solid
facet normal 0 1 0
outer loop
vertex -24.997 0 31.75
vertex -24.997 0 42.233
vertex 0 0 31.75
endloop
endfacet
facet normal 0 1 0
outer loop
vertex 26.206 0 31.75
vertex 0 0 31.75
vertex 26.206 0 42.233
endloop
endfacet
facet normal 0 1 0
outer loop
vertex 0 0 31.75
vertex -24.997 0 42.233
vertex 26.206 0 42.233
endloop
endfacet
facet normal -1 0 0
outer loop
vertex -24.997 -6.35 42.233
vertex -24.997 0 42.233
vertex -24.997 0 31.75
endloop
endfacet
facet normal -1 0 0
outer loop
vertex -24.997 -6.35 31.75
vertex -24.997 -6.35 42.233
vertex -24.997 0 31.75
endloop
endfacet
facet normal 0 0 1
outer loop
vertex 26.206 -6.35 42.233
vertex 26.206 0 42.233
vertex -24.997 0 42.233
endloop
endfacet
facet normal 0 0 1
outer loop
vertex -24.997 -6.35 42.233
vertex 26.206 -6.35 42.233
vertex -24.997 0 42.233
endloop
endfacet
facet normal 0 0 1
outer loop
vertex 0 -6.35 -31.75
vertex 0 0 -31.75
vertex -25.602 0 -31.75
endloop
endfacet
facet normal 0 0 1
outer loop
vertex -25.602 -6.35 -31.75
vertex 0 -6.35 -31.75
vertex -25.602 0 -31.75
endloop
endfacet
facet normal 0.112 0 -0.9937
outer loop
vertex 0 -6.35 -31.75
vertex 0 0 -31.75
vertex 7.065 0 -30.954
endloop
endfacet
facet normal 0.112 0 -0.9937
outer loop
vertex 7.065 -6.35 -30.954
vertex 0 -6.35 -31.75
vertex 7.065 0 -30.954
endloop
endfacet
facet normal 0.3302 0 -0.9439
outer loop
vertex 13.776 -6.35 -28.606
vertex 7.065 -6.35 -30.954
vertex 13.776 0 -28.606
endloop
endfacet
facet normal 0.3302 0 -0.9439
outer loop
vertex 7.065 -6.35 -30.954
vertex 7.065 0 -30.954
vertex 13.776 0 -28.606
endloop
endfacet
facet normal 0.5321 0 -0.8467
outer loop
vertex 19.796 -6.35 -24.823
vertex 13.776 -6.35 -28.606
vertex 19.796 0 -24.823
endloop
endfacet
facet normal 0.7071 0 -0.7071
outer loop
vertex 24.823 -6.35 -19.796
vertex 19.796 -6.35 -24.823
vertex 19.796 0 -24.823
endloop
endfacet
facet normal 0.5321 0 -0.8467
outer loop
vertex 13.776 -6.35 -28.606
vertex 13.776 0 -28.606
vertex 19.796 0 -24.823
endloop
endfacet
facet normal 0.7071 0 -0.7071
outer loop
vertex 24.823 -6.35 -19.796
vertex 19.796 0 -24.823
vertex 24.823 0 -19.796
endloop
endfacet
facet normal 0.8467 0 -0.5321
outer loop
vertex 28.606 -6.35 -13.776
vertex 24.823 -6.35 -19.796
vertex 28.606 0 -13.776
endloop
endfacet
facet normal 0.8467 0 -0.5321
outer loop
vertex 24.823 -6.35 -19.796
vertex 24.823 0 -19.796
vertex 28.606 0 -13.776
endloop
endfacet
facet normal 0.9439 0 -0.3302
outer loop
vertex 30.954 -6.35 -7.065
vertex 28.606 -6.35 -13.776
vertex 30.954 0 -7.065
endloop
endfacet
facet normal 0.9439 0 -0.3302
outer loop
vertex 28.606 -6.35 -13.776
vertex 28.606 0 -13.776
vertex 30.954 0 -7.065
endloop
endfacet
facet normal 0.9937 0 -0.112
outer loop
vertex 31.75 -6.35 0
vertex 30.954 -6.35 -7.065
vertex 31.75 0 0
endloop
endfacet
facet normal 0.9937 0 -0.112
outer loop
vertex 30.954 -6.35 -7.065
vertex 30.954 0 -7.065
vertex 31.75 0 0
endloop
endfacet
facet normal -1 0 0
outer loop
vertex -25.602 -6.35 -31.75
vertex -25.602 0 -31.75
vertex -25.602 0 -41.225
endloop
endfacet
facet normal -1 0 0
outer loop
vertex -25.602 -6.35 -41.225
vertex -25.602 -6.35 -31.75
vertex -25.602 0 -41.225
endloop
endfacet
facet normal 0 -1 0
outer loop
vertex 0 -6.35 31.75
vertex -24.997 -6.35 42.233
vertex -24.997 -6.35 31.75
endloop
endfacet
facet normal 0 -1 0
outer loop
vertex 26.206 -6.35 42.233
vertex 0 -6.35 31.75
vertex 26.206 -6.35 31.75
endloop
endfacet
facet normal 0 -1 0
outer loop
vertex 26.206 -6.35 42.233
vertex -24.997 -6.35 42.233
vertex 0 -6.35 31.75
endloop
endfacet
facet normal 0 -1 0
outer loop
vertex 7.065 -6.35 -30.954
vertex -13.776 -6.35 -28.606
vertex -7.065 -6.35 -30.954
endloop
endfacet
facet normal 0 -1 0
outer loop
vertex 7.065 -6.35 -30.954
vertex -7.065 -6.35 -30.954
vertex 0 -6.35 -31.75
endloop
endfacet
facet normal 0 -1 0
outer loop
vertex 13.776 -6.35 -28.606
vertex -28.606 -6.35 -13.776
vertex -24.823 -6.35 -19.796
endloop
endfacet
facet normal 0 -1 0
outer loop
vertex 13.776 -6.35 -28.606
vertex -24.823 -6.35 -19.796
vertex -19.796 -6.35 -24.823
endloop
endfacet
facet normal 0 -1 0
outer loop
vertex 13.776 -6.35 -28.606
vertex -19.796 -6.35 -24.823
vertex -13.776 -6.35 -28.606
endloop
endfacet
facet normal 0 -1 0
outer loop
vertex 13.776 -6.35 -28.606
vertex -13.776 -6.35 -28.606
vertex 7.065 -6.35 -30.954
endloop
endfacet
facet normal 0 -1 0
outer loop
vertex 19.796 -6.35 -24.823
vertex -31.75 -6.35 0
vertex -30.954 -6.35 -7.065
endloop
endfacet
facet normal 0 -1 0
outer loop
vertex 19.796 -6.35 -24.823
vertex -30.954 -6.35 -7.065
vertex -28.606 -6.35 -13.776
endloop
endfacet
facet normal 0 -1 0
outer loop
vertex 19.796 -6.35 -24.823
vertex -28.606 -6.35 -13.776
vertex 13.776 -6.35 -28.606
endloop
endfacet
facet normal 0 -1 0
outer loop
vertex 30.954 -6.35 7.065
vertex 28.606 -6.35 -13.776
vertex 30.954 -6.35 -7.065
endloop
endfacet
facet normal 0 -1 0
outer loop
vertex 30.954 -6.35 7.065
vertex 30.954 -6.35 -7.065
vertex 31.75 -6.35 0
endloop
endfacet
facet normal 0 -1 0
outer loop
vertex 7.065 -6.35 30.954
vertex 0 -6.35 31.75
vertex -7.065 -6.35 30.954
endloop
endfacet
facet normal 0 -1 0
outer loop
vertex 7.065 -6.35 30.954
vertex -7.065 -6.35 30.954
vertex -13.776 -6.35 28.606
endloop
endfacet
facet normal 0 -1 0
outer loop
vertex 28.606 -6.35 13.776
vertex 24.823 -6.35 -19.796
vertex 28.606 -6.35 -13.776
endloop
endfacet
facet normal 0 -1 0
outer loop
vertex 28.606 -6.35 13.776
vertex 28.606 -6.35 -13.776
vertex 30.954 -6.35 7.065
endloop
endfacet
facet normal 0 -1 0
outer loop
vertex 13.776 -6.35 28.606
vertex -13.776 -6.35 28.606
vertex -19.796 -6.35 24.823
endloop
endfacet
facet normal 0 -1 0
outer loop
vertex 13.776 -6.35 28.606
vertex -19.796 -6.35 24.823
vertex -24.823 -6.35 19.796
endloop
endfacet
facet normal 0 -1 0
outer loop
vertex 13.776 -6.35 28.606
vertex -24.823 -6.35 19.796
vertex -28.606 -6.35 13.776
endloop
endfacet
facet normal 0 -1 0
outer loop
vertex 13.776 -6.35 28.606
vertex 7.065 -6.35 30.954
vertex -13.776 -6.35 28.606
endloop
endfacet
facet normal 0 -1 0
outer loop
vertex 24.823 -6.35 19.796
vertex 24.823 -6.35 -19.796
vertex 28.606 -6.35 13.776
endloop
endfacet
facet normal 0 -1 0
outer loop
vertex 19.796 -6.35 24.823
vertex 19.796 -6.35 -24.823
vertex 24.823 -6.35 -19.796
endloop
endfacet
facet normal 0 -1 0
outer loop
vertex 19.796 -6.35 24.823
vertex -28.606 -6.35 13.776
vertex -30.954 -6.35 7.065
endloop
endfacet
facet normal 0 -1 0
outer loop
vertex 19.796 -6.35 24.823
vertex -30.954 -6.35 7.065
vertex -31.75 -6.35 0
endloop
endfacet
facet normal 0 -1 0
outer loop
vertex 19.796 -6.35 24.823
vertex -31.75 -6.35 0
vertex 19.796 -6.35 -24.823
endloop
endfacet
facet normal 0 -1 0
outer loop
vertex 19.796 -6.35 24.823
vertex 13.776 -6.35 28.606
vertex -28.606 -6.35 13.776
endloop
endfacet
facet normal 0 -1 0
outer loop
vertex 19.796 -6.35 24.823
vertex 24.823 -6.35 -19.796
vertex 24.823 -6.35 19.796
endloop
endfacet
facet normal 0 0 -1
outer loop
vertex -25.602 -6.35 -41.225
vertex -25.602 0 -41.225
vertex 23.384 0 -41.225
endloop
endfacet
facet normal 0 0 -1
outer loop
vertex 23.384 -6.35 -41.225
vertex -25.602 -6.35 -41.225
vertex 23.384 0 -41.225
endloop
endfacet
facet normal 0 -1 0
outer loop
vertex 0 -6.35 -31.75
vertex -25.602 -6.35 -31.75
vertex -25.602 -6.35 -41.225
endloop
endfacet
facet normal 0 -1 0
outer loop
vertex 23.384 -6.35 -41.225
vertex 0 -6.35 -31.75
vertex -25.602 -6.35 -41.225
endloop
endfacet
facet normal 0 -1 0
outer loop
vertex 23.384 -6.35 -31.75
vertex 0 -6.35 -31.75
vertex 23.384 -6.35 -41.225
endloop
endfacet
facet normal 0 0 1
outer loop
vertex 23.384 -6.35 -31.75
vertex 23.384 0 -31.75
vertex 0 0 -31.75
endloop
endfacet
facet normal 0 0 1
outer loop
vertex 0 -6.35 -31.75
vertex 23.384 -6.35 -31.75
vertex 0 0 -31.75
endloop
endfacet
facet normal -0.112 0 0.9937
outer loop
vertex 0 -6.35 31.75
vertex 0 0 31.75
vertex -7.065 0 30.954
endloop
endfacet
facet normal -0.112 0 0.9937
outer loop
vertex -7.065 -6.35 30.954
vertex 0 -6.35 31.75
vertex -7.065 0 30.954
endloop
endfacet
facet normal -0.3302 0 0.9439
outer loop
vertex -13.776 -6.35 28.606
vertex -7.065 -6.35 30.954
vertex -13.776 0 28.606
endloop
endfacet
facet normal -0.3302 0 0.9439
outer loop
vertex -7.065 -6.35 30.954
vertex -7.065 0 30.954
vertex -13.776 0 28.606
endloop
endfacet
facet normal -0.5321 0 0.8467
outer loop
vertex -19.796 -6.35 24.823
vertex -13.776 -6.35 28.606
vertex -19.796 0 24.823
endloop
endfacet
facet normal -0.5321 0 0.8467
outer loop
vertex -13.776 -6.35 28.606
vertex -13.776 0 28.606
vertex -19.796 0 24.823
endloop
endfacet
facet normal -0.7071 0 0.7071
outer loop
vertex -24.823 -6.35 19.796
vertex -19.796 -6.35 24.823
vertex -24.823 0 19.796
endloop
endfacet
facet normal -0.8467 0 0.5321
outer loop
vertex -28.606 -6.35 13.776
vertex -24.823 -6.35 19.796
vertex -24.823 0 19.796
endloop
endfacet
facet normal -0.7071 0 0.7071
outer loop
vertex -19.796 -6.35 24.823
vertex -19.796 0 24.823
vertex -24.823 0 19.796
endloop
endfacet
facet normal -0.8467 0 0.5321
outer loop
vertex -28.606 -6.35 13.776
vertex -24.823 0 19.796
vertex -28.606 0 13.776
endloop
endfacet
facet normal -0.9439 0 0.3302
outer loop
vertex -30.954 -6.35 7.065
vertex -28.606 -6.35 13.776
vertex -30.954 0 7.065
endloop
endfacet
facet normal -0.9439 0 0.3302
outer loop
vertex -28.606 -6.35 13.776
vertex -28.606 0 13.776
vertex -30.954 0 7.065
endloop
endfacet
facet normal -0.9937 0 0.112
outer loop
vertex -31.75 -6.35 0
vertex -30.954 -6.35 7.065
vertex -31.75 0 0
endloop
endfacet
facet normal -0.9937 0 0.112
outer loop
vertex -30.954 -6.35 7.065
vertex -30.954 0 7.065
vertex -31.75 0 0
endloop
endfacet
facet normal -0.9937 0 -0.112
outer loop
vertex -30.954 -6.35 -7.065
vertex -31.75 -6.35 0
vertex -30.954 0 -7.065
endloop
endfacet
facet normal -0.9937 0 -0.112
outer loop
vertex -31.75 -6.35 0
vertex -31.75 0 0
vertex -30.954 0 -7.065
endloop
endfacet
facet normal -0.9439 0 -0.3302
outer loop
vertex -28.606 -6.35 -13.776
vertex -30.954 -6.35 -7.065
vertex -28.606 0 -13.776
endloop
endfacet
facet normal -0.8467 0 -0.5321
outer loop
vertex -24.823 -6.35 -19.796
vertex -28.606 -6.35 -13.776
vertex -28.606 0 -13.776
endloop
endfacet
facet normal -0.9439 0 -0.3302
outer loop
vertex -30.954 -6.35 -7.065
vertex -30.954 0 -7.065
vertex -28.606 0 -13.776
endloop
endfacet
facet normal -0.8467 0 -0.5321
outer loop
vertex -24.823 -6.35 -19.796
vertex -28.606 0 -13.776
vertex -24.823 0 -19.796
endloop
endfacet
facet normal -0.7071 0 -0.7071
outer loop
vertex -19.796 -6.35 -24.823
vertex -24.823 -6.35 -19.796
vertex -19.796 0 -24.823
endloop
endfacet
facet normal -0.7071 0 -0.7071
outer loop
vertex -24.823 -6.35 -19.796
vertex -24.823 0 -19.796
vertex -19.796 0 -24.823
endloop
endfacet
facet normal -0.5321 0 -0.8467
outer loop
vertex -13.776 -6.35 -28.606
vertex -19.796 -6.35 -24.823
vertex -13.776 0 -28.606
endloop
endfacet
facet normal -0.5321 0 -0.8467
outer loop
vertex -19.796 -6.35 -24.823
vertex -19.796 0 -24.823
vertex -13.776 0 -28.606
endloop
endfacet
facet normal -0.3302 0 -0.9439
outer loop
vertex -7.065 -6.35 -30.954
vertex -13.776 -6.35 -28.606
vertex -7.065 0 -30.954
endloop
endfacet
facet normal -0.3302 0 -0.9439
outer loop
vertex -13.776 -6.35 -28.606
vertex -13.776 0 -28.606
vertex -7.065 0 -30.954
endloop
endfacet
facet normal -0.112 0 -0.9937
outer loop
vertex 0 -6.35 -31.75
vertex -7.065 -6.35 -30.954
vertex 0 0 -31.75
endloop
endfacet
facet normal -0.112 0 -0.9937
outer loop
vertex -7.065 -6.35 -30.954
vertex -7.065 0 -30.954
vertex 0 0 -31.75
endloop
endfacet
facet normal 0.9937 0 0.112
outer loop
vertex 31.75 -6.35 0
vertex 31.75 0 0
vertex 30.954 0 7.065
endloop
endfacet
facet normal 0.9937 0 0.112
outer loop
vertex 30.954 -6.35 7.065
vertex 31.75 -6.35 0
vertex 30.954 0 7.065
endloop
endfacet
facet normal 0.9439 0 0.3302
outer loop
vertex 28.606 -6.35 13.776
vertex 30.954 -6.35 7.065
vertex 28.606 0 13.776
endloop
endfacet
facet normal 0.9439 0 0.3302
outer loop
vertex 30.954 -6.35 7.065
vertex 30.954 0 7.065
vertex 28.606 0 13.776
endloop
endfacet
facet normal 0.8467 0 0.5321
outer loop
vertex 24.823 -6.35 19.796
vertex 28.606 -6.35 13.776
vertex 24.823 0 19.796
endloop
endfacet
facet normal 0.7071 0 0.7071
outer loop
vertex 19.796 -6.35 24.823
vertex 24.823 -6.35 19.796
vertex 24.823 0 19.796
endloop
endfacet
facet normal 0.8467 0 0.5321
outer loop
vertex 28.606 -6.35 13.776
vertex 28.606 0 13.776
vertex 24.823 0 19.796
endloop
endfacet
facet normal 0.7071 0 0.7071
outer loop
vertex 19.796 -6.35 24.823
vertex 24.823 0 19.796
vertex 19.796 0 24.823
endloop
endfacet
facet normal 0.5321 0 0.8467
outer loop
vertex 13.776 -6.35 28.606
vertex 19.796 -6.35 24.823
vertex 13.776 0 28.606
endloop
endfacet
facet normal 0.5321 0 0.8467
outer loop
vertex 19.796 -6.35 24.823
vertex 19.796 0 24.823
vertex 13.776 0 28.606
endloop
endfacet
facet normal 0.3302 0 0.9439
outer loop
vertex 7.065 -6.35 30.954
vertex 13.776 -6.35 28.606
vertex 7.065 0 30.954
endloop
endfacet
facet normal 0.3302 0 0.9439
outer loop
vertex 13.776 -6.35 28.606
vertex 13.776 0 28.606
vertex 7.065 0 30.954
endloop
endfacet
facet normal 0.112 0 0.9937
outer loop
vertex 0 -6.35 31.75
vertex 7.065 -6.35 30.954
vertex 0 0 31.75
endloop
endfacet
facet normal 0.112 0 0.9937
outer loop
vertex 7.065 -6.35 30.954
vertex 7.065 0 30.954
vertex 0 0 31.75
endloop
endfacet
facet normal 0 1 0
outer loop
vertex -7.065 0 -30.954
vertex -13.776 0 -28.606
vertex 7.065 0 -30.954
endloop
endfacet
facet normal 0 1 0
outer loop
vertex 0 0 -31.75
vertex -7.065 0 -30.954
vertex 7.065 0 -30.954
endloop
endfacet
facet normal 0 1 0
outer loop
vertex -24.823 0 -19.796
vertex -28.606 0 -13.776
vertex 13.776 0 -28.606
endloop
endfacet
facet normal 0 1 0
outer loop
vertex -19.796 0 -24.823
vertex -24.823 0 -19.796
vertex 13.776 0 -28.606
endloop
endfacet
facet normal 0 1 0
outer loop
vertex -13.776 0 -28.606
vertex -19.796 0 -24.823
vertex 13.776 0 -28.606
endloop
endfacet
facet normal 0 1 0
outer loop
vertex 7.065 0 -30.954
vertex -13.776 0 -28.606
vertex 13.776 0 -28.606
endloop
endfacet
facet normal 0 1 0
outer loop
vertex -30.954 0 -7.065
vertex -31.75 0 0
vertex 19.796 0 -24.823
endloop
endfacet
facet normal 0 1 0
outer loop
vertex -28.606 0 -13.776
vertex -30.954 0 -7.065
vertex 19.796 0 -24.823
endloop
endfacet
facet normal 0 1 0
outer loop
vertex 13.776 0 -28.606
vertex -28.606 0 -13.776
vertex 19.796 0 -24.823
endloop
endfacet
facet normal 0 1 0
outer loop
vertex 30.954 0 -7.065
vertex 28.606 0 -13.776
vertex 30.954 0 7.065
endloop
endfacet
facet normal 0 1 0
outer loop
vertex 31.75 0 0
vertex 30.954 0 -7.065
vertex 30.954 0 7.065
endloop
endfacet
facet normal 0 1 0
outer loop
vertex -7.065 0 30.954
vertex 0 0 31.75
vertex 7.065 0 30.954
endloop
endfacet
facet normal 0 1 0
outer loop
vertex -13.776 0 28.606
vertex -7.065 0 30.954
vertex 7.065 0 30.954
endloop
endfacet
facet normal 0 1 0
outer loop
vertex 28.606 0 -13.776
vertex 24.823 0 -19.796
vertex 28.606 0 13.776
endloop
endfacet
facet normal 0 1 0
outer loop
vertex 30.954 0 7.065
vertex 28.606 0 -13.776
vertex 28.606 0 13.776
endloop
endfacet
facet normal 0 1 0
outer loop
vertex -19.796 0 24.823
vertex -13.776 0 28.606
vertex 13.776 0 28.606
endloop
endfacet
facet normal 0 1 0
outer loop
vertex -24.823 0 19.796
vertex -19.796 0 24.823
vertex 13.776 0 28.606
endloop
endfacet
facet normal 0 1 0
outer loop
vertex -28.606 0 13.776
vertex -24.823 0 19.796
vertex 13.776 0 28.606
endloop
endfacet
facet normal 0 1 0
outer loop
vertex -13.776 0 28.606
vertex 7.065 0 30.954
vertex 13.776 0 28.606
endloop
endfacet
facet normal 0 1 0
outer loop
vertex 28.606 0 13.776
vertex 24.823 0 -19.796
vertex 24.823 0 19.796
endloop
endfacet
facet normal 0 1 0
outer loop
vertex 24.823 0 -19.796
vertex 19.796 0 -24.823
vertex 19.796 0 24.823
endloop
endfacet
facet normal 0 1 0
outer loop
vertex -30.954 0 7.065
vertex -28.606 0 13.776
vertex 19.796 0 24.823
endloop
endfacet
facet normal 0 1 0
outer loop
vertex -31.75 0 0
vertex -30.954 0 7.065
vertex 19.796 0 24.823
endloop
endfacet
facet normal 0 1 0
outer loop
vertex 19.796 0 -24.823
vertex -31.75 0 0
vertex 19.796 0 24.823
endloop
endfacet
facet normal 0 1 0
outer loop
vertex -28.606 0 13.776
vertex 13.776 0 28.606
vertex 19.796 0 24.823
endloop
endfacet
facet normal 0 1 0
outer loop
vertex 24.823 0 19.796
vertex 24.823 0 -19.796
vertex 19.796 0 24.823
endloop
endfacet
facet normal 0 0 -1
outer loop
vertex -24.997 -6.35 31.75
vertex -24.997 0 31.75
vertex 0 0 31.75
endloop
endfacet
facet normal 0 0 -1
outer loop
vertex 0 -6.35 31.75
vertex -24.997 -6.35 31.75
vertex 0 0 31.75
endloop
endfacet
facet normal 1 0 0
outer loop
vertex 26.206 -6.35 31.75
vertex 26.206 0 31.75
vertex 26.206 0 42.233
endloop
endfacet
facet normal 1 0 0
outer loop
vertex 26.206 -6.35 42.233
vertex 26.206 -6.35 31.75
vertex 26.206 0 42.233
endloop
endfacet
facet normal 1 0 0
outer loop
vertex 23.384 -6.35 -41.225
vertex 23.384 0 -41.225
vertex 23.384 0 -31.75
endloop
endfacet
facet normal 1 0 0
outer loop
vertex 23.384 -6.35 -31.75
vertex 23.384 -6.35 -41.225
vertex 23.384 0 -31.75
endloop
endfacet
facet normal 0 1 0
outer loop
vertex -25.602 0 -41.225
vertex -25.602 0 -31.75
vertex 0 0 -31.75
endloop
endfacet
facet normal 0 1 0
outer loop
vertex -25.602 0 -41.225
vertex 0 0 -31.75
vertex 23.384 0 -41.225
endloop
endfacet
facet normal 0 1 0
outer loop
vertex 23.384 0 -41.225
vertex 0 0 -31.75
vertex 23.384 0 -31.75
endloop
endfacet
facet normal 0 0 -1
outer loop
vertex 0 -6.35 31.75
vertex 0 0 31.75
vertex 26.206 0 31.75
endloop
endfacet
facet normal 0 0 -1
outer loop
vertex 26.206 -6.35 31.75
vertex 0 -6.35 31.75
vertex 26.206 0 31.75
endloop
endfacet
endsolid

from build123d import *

# Parameters (mm, degrees)
F1_DEPTH = 6.35
F2_DEPTH = 6.35
F3_DEPTH = 6.35


with BuildPart() as f1:
    # F0 (on Front) → F1 (new body)
    with BuildSketch(Plane.XZ):
        with BuildLine():
            ThreePointArc((0, -31.75), (22.45064, -22.45064), (31.75, 0))
            ThreePointArc((31.75, 0), (22.45064, 22.45064), (0, 31.75))
            ThreePointArc((0, 31.75), (-31.75, 0), (0, -31.75))
        make_face()
    extrude(amount=F1_DEPTH)

    # F0 (on Front) → F2 (join)
    with BuildSketch(Plane.XZ):
        Polygon((-24.996826, 31.75), (0, 31.75), (26.206352, 31.75), (26.206352, 42.232539), (-24.996826, 42.232539), align=None)
    extrude(amount=F2_DEPTH)

    # F0 (on Front) → F3 (join)
    with BuildSketch(Plane.XZ):
        Polygon((23.384127, -31.75), (0, -31.75), (-25.601588, -31.75), (-25.601588, -41.224604), (23.384127, -41.224604), align=None)
    extrude(amount=F3_DEPTH)


solid = f1.part
